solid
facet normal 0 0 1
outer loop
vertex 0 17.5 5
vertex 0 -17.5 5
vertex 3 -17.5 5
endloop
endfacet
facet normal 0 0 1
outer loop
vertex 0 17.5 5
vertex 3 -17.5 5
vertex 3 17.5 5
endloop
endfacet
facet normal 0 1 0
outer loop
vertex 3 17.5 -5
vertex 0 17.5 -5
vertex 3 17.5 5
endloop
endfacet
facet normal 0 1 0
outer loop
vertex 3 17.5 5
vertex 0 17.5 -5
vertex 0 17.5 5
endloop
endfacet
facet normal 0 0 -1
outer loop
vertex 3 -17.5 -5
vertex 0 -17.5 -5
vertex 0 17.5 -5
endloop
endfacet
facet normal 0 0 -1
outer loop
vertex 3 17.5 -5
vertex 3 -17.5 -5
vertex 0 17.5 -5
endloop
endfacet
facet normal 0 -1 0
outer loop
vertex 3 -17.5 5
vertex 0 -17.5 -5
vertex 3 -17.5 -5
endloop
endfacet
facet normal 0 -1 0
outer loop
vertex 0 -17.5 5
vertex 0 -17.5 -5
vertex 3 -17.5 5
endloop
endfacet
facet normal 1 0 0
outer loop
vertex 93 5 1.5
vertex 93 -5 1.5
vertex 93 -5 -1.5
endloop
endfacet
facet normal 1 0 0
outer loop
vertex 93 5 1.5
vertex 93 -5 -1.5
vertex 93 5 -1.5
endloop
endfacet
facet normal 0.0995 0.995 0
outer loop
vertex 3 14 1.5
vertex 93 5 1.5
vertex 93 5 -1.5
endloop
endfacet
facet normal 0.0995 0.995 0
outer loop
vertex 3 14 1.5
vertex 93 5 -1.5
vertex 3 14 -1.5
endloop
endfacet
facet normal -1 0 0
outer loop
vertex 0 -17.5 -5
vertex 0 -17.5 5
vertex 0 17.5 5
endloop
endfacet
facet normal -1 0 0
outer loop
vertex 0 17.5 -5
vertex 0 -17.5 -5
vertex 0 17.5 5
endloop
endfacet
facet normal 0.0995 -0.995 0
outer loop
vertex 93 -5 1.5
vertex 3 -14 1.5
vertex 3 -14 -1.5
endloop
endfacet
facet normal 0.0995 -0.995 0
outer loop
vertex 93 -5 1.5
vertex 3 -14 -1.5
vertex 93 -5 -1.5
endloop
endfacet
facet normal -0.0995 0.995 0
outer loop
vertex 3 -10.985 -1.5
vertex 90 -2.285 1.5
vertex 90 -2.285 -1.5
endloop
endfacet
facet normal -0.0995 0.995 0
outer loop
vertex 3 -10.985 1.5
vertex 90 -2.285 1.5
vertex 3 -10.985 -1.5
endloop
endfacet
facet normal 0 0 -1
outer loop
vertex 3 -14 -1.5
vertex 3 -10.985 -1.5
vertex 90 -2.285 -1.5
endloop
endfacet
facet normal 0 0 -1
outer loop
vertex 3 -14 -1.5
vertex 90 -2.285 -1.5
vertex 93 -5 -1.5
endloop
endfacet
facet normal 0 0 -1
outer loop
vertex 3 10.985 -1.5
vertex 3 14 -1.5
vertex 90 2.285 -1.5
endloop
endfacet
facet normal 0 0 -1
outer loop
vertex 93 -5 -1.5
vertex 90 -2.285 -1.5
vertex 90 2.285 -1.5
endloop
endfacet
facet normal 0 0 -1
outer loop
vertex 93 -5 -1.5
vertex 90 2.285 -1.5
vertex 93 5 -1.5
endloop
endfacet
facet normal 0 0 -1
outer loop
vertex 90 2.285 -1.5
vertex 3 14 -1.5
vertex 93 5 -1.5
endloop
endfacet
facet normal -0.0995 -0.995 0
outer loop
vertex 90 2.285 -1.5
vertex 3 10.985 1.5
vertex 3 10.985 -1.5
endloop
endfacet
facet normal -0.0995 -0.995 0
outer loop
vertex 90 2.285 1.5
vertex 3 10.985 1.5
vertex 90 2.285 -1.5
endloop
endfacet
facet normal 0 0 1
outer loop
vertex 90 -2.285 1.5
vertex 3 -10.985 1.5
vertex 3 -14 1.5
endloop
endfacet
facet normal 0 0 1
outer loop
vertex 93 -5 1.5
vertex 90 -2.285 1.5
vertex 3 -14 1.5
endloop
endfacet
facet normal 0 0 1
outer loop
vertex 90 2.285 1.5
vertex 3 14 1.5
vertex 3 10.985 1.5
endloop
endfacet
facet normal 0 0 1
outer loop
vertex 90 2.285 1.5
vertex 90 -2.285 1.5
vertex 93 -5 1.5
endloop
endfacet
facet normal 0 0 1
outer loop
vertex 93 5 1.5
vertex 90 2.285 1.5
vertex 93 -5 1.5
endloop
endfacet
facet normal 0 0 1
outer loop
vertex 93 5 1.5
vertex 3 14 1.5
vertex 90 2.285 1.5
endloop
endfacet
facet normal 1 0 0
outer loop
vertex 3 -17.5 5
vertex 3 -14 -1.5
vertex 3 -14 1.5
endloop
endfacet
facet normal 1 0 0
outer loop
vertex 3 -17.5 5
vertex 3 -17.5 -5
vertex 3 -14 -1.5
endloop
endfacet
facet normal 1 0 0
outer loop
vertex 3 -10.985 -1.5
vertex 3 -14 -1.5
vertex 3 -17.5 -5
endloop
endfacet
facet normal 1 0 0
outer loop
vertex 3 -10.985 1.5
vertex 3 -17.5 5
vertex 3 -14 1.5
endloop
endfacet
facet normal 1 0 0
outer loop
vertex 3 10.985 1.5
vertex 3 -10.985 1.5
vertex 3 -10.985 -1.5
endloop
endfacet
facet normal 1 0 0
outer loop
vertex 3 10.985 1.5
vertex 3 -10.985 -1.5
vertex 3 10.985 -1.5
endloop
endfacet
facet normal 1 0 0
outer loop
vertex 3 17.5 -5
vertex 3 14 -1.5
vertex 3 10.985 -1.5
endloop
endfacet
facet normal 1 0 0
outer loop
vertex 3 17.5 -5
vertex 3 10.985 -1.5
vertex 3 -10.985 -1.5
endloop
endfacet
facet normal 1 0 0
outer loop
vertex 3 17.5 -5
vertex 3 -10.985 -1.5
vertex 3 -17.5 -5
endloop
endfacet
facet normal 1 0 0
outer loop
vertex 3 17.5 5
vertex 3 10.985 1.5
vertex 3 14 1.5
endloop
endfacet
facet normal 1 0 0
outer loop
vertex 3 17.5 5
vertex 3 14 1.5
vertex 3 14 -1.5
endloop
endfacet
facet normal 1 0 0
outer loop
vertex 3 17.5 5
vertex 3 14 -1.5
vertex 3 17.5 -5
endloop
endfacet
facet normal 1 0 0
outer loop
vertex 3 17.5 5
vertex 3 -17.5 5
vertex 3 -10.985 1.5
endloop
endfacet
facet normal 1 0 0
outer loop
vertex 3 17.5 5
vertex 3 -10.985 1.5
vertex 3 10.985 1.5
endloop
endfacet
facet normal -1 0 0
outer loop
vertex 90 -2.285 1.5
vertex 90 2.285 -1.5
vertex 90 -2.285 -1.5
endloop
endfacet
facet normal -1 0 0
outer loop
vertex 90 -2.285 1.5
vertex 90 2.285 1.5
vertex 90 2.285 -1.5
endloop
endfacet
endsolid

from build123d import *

# Parameters (mm, degrees)
F0_W     = 35
F0_H     = 10
F1_DEPTH = 3
F3_DEPTH = 1.5


with BuildPart() as f1:
    # F0 (on Right) → F1 (new body)
    with BuildSketch(Plane.YZ):
        Rectangle(F0_W, F0_H)
    extrude(amount=F1_DEPTH)

    # F2 (on Top) → F3 (join, symmetric)
    with BuildSketch(Plane.XY):
        Polygon((3, -10.985037), (3, -14), (93, -5), (93, 5), (3, 14), (3, 10.985037), (90, 2.285037), (90, -2.285037), align=None)
    extrude(amount=F3_DEPTH, both=True)


solid = f1.part
